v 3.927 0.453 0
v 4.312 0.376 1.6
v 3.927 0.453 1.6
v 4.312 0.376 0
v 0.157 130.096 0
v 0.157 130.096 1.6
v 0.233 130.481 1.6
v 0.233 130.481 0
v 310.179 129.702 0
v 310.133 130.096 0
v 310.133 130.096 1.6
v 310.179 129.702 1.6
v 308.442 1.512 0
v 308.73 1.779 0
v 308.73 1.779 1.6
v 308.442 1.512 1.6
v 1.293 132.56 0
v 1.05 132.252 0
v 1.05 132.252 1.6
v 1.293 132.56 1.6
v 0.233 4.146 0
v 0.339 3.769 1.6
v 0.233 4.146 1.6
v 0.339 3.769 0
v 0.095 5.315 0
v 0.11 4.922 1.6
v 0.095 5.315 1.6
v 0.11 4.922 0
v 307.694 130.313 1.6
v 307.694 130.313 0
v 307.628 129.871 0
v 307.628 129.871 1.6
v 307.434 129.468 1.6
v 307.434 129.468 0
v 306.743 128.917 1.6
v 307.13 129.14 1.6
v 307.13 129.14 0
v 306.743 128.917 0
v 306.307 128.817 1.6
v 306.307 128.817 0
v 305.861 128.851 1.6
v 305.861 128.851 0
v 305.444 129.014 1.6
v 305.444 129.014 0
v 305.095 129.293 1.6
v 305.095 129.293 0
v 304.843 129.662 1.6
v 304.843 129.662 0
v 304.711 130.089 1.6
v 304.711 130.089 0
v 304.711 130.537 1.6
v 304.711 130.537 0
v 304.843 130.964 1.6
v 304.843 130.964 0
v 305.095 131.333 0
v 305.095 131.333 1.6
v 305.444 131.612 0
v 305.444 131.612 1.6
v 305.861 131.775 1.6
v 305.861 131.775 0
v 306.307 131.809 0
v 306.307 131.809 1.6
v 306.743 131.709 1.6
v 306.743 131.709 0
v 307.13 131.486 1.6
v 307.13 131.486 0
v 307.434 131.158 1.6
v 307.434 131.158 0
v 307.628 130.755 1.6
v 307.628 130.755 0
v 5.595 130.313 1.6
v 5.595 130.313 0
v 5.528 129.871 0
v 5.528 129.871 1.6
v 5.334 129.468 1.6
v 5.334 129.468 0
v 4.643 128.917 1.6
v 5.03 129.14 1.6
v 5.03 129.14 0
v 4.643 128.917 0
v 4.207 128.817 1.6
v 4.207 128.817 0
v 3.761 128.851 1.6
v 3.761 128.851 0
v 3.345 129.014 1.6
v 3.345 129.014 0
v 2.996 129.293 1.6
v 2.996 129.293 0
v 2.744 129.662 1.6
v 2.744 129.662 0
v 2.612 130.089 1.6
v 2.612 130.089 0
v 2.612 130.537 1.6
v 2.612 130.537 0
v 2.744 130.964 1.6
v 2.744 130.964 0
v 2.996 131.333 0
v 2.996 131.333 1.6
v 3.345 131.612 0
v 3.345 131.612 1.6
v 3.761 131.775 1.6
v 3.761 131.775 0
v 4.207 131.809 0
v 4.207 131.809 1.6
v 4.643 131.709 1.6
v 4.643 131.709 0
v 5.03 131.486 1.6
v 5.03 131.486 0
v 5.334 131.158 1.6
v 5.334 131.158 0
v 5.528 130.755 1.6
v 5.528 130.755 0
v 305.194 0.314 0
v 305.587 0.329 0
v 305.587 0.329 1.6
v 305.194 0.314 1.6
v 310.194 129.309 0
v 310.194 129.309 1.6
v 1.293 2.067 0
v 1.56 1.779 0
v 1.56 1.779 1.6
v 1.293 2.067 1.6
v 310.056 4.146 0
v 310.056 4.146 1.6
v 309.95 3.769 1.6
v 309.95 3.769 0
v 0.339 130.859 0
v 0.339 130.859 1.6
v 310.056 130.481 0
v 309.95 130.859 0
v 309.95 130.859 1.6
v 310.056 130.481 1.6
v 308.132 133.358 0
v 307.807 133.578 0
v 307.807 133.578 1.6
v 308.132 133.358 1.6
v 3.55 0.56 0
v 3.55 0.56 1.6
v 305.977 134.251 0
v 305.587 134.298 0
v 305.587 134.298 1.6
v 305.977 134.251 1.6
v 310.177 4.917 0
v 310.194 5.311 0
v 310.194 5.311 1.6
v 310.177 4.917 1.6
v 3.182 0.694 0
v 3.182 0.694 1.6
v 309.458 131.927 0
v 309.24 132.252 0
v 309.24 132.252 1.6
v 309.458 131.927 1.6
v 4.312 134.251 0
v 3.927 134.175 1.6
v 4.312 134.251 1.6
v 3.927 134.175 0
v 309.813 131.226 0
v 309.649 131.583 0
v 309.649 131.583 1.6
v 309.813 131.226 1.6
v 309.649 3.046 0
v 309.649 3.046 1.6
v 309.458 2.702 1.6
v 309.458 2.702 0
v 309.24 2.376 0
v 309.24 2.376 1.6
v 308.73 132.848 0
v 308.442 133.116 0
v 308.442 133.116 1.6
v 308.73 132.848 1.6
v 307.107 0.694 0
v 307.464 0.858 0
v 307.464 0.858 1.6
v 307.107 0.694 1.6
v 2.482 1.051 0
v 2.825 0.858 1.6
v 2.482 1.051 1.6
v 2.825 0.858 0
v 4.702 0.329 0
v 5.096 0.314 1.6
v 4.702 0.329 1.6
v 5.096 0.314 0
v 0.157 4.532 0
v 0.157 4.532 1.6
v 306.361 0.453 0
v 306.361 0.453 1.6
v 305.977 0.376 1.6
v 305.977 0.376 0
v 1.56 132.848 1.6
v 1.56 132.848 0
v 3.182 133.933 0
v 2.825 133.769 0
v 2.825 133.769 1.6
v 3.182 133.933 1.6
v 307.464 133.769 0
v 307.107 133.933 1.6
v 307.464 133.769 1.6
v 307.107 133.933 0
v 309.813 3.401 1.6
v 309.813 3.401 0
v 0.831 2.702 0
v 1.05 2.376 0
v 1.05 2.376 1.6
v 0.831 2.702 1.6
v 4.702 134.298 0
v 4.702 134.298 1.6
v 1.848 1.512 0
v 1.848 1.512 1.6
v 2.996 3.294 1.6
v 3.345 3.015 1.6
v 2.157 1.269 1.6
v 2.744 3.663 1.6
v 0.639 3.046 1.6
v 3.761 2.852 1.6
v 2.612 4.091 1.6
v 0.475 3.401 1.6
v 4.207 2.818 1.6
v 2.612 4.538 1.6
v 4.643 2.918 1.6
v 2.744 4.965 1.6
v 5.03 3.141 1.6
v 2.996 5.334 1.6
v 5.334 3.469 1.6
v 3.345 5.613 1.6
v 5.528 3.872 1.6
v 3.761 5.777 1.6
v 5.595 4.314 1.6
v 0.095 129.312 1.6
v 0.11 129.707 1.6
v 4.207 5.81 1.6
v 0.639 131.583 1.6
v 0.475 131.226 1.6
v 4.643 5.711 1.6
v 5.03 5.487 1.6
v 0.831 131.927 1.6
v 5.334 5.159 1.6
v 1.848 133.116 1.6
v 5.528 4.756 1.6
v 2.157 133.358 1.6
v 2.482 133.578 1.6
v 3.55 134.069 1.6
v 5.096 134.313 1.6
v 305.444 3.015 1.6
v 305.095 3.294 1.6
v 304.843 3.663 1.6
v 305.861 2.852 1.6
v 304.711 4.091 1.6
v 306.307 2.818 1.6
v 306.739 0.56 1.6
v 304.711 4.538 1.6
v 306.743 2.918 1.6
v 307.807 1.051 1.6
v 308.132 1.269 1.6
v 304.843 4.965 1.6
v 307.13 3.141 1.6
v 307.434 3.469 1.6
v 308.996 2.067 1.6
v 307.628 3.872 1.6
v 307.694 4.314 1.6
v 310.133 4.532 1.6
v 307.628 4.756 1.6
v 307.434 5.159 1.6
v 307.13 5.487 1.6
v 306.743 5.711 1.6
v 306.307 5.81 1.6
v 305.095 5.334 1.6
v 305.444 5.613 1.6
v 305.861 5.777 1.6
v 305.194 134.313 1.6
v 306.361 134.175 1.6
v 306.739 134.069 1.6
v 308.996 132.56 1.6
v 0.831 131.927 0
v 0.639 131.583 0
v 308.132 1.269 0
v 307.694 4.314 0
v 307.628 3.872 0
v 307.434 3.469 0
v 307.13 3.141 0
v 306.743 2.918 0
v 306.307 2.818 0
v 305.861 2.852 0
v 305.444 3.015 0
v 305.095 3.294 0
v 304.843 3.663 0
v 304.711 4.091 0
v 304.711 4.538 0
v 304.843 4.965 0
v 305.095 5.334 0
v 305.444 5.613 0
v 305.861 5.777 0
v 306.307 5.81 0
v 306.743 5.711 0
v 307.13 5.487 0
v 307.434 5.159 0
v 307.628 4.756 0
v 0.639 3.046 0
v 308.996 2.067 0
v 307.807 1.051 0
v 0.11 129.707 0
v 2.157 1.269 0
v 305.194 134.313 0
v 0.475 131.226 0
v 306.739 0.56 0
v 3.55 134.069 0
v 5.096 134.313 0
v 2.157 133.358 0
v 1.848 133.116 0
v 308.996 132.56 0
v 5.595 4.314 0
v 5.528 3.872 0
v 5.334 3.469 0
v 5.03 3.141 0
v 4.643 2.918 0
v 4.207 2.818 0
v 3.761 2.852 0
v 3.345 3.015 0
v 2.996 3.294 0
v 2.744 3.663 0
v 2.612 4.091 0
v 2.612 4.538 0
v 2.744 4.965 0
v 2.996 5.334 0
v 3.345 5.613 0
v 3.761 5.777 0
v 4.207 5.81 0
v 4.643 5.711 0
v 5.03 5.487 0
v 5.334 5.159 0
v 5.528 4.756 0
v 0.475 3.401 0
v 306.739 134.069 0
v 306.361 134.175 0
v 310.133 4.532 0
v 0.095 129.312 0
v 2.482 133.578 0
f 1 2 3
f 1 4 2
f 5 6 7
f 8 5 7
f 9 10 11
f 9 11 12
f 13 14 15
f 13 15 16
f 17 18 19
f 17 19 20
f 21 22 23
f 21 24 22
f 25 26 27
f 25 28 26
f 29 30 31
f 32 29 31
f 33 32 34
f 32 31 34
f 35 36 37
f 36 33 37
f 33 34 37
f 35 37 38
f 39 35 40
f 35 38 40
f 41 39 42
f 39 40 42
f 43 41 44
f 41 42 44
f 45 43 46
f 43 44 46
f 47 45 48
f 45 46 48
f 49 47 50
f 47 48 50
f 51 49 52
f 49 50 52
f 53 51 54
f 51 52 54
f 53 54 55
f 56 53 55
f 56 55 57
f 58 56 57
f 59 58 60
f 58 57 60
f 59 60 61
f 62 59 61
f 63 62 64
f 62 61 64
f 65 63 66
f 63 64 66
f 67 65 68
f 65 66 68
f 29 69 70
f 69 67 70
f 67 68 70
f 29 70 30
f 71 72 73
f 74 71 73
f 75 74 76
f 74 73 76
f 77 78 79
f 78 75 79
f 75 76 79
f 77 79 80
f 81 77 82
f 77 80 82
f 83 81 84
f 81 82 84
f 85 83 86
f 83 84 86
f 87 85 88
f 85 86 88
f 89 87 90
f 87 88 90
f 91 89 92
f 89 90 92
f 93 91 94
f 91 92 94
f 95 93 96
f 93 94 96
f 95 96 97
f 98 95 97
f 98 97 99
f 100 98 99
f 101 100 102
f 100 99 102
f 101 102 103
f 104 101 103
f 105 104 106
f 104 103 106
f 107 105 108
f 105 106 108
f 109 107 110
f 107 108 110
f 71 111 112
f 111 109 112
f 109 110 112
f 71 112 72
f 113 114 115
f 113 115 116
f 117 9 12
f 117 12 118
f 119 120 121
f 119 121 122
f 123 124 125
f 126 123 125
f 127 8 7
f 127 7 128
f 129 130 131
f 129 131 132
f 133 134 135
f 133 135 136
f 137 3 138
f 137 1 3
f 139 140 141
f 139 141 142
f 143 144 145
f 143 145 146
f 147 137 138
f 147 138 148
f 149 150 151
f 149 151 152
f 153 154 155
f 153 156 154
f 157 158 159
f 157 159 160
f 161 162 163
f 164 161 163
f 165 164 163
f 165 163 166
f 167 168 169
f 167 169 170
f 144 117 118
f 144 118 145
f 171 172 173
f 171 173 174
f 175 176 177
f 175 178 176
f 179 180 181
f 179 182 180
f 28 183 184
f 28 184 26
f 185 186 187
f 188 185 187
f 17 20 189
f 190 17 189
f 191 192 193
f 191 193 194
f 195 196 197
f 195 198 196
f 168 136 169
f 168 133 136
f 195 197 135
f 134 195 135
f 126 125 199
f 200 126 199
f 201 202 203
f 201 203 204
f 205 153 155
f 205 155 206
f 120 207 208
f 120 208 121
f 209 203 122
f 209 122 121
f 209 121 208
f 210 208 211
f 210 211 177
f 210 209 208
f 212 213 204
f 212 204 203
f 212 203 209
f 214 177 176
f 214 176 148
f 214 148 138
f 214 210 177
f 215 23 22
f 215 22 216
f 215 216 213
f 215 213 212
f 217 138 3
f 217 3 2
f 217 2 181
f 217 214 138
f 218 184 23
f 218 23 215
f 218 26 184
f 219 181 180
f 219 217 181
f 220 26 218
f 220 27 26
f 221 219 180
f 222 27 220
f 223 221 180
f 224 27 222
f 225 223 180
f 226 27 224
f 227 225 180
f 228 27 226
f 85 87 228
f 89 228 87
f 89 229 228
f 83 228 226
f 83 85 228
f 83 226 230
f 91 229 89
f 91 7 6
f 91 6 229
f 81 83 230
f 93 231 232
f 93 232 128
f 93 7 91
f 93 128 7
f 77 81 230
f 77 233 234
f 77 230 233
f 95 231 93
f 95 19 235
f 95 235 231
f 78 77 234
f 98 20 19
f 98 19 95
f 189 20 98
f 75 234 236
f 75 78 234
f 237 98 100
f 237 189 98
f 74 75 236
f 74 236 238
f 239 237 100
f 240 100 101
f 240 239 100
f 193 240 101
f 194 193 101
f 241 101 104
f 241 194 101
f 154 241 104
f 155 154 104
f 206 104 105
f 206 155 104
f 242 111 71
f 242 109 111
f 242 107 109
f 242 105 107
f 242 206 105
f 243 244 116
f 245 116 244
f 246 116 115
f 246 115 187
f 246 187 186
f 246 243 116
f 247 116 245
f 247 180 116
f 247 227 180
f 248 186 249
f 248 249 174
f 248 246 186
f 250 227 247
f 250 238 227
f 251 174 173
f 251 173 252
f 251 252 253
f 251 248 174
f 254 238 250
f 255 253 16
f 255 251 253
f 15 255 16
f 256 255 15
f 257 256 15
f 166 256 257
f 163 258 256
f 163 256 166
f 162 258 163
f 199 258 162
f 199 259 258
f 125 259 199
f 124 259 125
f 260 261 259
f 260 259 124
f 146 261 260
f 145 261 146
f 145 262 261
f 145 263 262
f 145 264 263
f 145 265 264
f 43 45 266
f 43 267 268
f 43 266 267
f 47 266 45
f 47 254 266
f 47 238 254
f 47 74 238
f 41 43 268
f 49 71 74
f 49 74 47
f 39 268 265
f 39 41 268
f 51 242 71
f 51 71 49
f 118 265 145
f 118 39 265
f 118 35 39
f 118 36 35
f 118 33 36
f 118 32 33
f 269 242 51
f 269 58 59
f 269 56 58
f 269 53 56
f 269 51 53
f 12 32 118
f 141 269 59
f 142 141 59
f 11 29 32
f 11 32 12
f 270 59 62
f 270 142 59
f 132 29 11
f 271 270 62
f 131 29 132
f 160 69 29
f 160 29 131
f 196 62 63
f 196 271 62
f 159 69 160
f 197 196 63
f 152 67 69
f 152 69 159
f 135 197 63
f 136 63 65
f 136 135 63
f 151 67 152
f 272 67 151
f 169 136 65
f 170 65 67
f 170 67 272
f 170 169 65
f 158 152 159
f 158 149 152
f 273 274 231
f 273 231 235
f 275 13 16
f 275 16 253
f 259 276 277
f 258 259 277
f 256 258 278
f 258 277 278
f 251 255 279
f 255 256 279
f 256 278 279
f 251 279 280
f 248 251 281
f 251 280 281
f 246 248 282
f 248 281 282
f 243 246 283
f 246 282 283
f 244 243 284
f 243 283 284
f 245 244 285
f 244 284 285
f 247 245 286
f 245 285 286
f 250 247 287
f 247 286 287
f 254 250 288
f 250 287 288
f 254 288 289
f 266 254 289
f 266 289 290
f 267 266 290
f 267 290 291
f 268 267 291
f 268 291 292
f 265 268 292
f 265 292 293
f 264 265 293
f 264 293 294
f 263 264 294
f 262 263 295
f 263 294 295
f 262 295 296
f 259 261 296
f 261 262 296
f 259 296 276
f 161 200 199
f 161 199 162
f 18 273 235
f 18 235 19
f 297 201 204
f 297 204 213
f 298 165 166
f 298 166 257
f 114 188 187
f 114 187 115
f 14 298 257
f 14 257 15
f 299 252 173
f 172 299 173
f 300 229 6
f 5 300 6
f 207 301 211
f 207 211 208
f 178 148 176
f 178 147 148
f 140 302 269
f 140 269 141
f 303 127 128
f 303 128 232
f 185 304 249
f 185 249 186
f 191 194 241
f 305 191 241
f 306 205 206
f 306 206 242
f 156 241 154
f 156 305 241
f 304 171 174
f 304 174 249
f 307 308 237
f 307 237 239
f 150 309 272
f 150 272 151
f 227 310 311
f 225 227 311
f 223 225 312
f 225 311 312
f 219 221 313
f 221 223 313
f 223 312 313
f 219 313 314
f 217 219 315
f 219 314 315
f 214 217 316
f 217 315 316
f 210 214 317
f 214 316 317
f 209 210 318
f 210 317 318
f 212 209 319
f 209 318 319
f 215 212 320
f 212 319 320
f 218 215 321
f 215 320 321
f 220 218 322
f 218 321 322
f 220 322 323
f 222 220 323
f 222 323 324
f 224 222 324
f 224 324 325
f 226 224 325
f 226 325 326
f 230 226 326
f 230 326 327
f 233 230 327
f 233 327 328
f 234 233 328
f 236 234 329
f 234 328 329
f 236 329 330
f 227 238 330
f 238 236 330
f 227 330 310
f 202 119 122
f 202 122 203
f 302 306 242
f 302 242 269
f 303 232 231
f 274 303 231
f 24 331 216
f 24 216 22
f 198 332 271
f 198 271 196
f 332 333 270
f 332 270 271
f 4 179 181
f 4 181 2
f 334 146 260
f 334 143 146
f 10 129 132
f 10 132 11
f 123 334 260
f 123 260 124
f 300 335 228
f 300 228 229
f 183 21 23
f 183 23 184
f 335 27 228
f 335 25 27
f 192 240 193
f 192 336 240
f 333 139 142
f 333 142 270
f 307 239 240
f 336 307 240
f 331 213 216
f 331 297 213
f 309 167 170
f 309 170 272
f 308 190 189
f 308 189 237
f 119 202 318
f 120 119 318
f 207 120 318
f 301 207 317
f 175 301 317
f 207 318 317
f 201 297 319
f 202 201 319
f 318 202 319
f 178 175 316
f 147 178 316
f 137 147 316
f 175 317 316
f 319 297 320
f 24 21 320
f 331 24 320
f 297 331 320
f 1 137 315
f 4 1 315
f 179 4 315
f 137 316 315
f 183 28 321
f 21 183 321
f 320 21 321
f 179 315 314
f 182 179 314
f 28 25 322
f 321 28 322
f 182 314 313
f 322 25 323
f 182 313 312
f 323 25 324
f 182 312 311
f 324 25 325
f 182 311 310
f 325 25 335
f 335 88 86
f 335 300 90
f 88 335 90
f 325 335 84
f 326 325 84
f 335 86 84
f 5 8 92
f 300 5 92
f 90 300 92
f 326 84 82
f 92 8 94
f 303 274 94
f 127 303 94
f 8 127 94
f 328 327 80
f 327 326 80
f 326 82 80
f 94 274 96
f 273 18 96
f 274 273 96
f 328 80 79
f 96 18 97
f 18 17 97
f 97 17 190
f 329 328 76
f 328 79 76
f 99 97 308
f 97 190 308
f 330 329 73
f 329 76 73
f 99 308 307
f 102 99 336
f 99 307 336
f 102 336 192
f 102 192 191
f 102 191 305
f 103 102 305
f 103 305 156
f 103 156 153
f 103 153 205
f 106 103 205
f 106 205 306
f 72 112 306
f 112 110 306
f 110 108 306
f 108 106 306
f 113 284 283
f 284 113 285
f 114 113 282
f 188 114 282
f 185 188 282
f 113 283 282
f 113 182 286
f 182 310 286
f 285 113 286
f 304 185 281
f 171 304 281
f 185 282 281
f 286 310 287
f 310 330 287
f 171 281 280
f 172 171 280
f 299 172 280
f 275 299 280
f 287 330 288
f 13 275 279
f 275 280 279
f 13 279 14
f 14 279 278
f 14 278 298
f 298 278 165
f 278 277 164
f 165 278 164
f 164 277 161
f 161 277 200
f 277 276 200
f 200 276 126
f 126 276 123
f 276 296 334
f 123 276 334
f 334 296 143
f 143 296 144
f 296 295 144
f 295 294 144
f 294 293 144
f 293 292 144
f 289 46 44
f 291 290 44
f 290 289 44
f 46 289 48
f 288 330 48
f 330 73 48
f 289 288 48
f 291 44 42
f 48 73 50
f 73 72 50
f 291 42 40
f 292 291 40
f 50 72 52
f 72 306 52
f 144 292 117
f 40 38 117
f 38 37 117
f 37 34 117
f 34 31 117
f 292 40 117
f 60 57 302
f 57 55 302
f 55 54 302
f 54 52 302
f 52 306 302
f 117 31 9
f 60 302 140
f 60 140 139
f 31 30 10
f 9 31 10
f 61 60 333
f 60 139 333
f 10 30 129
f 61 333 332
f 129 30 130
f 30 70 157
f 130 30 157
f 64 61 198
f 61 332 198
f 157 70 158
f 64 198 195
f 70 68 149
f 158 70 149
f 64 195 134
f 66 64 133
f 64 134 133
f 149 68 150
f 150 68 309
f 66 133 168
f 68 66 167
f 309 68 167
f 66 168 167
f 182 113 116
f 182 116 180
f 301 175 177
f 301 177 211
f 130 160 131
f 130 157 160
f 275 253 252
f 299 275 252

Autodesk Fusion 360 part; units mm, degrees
sketch "Sketch1" plane through (0, 0, 0) normal (0, 0, 1) x (1, 0, 0)
  circle A0 centre (4.0951, 130.313) radius 1.5
  line L0 (3.5498, 134.069) -> (3.9274, 134.175)
  line L1 (2.4819, 133.578) -> (2.825, 133.769)
  line L2 (2.1566, 133.358) -> (2.4819, 133.578)
  line L3 (0.2329, 130.481) -> (0.339, 130.859)
  line L4 (3.1819, 133.933) -> (3.5498, 134.069)
  line L5 (1.0501, 132.252) -> (1.2926, 132.56)
  line L6 (4.7019, 134.298) -> (5.096, 134.313)
  line L7 (2.825, 133.769) -> (3.1819, 133.933)
  line L8 (0.1571, 130.096) -> (0.2329, 130.481)
  line L9 (4.3119, 134.251) -> (4.7019, 134.298)
  line L10 (1.5599, 132.848) -> (1.8479, 133.116)
  line L11 (1.2926, 132.56) -> (1.5599, 132.848)
  line L12 (0.339, 130.859) -> (0.4754, 131.226)
  line L13 (1.848, 133.116) -> (2.1566, 133.358)
  line L14 (0.831, 131.927) -> (1.0501, 132.252)
  line L15 (0.4754, 131.226) -> (0.6394, 131.583)
  line L16 (0.1102, 129.707) -> (0.1571, 130.096)
  line L17 (3.9274, 134.175) -> (4.3119, 134.251)
  line L18 (310.1945, 129.3093) -> (310.1945, 5.3108)
  line L19 (0.6394, 131.583) -> (0.831, 131.927)
  line L20 (0.0951, 129.312) -> (0.1102, 129.707)
  line L21 (306.361, 0.4534) -> (305.977, 0.3762)
  line L22 (305.587, 0.3294) -> (305.194, 0.3142)
  circle A1 centre (306.1945, 4.3142) radius 1.5
  line L23 (310.056, 4.1465) -> (309.95, 3.7689)
  line L24 (310.1945, 5.3108) -> (310.1774, 4.9174)
  line L25 (310.1774, 4.9174) -> (310.133, 4.5324)
  line L26 (1.0501, 2.3757) -> (0.831, 2.7023)
  line L27 (3.1819, 0.6945) -> (2.825, 0.8585)
  line L28 (0.2329, 4.1465) -> (0.1571, 4.5324)
  line L29 (0.831, 2.7023) -> (0.6394, 3.0455)
  line L30 (0.339, 3.7689) -> (0.2329, 4.1465)
  line L31 (1.848, 1.5117) -> (1.5599, 1.7791)
  line L32 (3.9274, 0.4534) -> (3.5498, 0.5595)
  line L33 (0.1571, 4.5324) -> (0.1102, 4.9223)
  line L34 (0.4754, 3.401) -> (0.339, 3.7689)
  circle A2 centre (4.0951, 4.3142) radius 1.5
  line L35 (305.194, 0.3142) -> (5.096, 0.3142)
  line L36 (310.133, 4.5324) -> (310.056, 4.1465)
  line L37 (309.24, 2.3757) -> (308.996, 2.0671)
  line L38 (2.4819, 1.0514) -> (2.1566, 1.2692)
  line L39 (2.1566, 1.2692) -> (1.8479, 1.5117)
  line L40 (308.73, 1.7791) -> (308.442, 1.5117)
  line L41 (307.807, 1.0514) -> (307.464, 0.8585)
  line L42 (307.464, 0.8585) -> (307.107, 0.6945)
  line L43 (2.825, 0.8585) -> (2.4819, 1.0514)
  line L44 (309.649, 3.0455) -> (309.458, 2.7023)
  line L45 (306.739, 0.5595) -> (306.361, 0.4534)
  line L46 (3.5498, 0.5595) -> (3.1819, 0.6945)
  line L47 (0.6394, 3.0455) -> (0.4754, 3.401)
  line L48 (4.7019, 0.3294) -> (4.3119, 0.3762)
  line L49 (308.132, 1.2692) -> (307.807, 1.0514)
  line L50 (307.107, 0.6945) -> (306.739, 0.5595)
  line L51 (4.3119, 0.3762) -> (3.9274, 0.4534)
  line L52 (1.2926, 2.0671) -> (1.0501, 2.3757)
  line L53 (308.996, 2.0671) -> (308.73, 1.7791)
  line L54 (308.442, 1.5117) -> (308.132, 1.2692)
  line L55 (309.458, 2.7023) -> (309.24, 2.3757)
  line L56 (308.132, 133.358) -> (308.442, 133.116)
  line L57 (305.977, 134.251) -> (306.361, 134.175)
  line L58 (5.096, 134.313) -> (305.194, 134.313)
  line L59 (77.0546, 0.3142) -> (190.5635, 0.3142)
  line L60 (0.0951, 5.3151) -> (0.0951, 129.312)
  line L61 (307.464, 133.769) -> (307.807, 133.578)
  line L62 (305.587, 134.298) -> (305.977, 134.251)
  line L63 (305.194, 134.313) -> (305.587, 134.298)
  line L64 (310.1786, 129.702) -> (310.1945, 129.3093)
  line L65 (307.107, 133.933) -> (307.464, 133.769)
  line L66 (306.739, 134.069) -> (307.107, 133.933)
  line L67 (308.996, 132.56) -> (309.24, 132.252)
  line L68 (310.056, 130.481) -> (310.133, 130.096)
  line L69 (309.24, 132.252) -> (309.458, 131.927)
  circle A3 centre (306.1945, 130.313) radius 1.5
  line L70 (310.133, 130.096) -> (310.1786, 129.702)
  line L71 (309.813, 131.226) -> (309.95, 130.859)
  line L72 (308.442, 133.116) -> (308.73, 132.848)
  line L73 (307.807, 133.578) -> (308.132, 133.358)
  line L74 (306.361, 134.175) -> (306.739, 134.069)
  line L75 (309.95, 130.859) -> (310.056, 130.481)
  line L76 (309.649, 131.583) -> (309.813, 131.226)
  line L77 (309.458, 131.927) -> (309.649, 131.583)
  line L78 (308.73, 132.848) -> (308.996, 132.56)
  line L79 (309.813, 3.401) -> (309.649, 3.0455)
  line L80 (0.1102, 4.9223) -> (0.0951, 5.3151)
  line L81 (5.096, 0.3142) -> (4.7019, 0.3294)
  line L82 (1.5599, 1.7791) -> (1.2926, 2.0671)
  line L83 (309.95, 3.7689) -> (309.813, 3.401)
  line L84 (305.977, 0.3762) -> (305.587, 0.3294)
  line L85 (189.7195, 134.313) -> (175.4705, 134.313)
  line L86 (175.4705, 134.313) -> (175.4705, 119.313)
  line L87 (175.4705, 119.313) -> (189.7195, 119.313)
  line L88 (189.7195, 119.313) -> (189.7195, 134.313)
  line L89 (162.5451, 119.783) -> (142.1051, 119.783)
  line L90 (142.1051, 119.783) -> (142.1051, 124.983)
  line L91 (142.1051, 124.983) -> (162.5451, 124.983)
  line L92 (162.5451, 124.983) -> (162.5451, 119.783)
  line L93 (172.0551, 119.923) -> (164.3351, 119.923)
  line L94 (164.3351, 119.923) -> (164.3351, 127.923)
  line L95 (164.3351, 127.923) -> (172.0551, 127.923)
  line L96 (172.0551, 127.923) -> (172.0551, 119.923)
  dimension "d381" = 3
  dimension "d382" = 3
  dimension "d383" = 3
  dimension "d384" = 3
  dimension "d385" = 4
  dimension "d386" = 4
  dimension "d387" = 4
  dimension "d388" = 4
  dimension "d389" = 4
  dimension "d390" = 4
  dimension "d391" = 4
  dimension "d392" = 4
  dimension "d414" = 123.9985
  dimension "d415" = 300.098
  dimension "d582" = 14.249
  dimension "d583" = 15
  dimension "d584" = 120.475
  dimension "d585" = 20.44
  dimension "d586" = 5.2
  dimension "d587" = 142.01
  dimension "d588" = 9.33
  dimension "d589" = 8
  dimension "d590" = 7.72
  dimension "d591" = 1.79
  dimension "d592" = 6.39
extrude "Extrude1" add sketch "Sketch1" along normal blind 1.6 contours L0 L1 L2 L3 L4 L5 L6 L7 L8 L9 L10 L11 L12 L13 L14 L15 L16 L17 L18 L19 L20 L21 L22 L23 L24 L25 L26 L27 L28 L29 L30 L31 L32 L33 L34 L35 L36 L37 L38 L39 L40 L41 L42 L43 L44 L45 L46 L47 L48 L49 L50 L51 L52 L53 L54 L55 L56 L57 L58 L59 L60 L61 L62 L63 L64 L65 L66 L67 L68 L69 L70 L71 L72 L73 L74 L75 L76 L77 L78 L79 L80 L81 L82 L83 L84 L86 L87 L88 | L58 L85 L86 L87 L88 | L89 L90 L91 L92 | L93 L94 L95 L96
